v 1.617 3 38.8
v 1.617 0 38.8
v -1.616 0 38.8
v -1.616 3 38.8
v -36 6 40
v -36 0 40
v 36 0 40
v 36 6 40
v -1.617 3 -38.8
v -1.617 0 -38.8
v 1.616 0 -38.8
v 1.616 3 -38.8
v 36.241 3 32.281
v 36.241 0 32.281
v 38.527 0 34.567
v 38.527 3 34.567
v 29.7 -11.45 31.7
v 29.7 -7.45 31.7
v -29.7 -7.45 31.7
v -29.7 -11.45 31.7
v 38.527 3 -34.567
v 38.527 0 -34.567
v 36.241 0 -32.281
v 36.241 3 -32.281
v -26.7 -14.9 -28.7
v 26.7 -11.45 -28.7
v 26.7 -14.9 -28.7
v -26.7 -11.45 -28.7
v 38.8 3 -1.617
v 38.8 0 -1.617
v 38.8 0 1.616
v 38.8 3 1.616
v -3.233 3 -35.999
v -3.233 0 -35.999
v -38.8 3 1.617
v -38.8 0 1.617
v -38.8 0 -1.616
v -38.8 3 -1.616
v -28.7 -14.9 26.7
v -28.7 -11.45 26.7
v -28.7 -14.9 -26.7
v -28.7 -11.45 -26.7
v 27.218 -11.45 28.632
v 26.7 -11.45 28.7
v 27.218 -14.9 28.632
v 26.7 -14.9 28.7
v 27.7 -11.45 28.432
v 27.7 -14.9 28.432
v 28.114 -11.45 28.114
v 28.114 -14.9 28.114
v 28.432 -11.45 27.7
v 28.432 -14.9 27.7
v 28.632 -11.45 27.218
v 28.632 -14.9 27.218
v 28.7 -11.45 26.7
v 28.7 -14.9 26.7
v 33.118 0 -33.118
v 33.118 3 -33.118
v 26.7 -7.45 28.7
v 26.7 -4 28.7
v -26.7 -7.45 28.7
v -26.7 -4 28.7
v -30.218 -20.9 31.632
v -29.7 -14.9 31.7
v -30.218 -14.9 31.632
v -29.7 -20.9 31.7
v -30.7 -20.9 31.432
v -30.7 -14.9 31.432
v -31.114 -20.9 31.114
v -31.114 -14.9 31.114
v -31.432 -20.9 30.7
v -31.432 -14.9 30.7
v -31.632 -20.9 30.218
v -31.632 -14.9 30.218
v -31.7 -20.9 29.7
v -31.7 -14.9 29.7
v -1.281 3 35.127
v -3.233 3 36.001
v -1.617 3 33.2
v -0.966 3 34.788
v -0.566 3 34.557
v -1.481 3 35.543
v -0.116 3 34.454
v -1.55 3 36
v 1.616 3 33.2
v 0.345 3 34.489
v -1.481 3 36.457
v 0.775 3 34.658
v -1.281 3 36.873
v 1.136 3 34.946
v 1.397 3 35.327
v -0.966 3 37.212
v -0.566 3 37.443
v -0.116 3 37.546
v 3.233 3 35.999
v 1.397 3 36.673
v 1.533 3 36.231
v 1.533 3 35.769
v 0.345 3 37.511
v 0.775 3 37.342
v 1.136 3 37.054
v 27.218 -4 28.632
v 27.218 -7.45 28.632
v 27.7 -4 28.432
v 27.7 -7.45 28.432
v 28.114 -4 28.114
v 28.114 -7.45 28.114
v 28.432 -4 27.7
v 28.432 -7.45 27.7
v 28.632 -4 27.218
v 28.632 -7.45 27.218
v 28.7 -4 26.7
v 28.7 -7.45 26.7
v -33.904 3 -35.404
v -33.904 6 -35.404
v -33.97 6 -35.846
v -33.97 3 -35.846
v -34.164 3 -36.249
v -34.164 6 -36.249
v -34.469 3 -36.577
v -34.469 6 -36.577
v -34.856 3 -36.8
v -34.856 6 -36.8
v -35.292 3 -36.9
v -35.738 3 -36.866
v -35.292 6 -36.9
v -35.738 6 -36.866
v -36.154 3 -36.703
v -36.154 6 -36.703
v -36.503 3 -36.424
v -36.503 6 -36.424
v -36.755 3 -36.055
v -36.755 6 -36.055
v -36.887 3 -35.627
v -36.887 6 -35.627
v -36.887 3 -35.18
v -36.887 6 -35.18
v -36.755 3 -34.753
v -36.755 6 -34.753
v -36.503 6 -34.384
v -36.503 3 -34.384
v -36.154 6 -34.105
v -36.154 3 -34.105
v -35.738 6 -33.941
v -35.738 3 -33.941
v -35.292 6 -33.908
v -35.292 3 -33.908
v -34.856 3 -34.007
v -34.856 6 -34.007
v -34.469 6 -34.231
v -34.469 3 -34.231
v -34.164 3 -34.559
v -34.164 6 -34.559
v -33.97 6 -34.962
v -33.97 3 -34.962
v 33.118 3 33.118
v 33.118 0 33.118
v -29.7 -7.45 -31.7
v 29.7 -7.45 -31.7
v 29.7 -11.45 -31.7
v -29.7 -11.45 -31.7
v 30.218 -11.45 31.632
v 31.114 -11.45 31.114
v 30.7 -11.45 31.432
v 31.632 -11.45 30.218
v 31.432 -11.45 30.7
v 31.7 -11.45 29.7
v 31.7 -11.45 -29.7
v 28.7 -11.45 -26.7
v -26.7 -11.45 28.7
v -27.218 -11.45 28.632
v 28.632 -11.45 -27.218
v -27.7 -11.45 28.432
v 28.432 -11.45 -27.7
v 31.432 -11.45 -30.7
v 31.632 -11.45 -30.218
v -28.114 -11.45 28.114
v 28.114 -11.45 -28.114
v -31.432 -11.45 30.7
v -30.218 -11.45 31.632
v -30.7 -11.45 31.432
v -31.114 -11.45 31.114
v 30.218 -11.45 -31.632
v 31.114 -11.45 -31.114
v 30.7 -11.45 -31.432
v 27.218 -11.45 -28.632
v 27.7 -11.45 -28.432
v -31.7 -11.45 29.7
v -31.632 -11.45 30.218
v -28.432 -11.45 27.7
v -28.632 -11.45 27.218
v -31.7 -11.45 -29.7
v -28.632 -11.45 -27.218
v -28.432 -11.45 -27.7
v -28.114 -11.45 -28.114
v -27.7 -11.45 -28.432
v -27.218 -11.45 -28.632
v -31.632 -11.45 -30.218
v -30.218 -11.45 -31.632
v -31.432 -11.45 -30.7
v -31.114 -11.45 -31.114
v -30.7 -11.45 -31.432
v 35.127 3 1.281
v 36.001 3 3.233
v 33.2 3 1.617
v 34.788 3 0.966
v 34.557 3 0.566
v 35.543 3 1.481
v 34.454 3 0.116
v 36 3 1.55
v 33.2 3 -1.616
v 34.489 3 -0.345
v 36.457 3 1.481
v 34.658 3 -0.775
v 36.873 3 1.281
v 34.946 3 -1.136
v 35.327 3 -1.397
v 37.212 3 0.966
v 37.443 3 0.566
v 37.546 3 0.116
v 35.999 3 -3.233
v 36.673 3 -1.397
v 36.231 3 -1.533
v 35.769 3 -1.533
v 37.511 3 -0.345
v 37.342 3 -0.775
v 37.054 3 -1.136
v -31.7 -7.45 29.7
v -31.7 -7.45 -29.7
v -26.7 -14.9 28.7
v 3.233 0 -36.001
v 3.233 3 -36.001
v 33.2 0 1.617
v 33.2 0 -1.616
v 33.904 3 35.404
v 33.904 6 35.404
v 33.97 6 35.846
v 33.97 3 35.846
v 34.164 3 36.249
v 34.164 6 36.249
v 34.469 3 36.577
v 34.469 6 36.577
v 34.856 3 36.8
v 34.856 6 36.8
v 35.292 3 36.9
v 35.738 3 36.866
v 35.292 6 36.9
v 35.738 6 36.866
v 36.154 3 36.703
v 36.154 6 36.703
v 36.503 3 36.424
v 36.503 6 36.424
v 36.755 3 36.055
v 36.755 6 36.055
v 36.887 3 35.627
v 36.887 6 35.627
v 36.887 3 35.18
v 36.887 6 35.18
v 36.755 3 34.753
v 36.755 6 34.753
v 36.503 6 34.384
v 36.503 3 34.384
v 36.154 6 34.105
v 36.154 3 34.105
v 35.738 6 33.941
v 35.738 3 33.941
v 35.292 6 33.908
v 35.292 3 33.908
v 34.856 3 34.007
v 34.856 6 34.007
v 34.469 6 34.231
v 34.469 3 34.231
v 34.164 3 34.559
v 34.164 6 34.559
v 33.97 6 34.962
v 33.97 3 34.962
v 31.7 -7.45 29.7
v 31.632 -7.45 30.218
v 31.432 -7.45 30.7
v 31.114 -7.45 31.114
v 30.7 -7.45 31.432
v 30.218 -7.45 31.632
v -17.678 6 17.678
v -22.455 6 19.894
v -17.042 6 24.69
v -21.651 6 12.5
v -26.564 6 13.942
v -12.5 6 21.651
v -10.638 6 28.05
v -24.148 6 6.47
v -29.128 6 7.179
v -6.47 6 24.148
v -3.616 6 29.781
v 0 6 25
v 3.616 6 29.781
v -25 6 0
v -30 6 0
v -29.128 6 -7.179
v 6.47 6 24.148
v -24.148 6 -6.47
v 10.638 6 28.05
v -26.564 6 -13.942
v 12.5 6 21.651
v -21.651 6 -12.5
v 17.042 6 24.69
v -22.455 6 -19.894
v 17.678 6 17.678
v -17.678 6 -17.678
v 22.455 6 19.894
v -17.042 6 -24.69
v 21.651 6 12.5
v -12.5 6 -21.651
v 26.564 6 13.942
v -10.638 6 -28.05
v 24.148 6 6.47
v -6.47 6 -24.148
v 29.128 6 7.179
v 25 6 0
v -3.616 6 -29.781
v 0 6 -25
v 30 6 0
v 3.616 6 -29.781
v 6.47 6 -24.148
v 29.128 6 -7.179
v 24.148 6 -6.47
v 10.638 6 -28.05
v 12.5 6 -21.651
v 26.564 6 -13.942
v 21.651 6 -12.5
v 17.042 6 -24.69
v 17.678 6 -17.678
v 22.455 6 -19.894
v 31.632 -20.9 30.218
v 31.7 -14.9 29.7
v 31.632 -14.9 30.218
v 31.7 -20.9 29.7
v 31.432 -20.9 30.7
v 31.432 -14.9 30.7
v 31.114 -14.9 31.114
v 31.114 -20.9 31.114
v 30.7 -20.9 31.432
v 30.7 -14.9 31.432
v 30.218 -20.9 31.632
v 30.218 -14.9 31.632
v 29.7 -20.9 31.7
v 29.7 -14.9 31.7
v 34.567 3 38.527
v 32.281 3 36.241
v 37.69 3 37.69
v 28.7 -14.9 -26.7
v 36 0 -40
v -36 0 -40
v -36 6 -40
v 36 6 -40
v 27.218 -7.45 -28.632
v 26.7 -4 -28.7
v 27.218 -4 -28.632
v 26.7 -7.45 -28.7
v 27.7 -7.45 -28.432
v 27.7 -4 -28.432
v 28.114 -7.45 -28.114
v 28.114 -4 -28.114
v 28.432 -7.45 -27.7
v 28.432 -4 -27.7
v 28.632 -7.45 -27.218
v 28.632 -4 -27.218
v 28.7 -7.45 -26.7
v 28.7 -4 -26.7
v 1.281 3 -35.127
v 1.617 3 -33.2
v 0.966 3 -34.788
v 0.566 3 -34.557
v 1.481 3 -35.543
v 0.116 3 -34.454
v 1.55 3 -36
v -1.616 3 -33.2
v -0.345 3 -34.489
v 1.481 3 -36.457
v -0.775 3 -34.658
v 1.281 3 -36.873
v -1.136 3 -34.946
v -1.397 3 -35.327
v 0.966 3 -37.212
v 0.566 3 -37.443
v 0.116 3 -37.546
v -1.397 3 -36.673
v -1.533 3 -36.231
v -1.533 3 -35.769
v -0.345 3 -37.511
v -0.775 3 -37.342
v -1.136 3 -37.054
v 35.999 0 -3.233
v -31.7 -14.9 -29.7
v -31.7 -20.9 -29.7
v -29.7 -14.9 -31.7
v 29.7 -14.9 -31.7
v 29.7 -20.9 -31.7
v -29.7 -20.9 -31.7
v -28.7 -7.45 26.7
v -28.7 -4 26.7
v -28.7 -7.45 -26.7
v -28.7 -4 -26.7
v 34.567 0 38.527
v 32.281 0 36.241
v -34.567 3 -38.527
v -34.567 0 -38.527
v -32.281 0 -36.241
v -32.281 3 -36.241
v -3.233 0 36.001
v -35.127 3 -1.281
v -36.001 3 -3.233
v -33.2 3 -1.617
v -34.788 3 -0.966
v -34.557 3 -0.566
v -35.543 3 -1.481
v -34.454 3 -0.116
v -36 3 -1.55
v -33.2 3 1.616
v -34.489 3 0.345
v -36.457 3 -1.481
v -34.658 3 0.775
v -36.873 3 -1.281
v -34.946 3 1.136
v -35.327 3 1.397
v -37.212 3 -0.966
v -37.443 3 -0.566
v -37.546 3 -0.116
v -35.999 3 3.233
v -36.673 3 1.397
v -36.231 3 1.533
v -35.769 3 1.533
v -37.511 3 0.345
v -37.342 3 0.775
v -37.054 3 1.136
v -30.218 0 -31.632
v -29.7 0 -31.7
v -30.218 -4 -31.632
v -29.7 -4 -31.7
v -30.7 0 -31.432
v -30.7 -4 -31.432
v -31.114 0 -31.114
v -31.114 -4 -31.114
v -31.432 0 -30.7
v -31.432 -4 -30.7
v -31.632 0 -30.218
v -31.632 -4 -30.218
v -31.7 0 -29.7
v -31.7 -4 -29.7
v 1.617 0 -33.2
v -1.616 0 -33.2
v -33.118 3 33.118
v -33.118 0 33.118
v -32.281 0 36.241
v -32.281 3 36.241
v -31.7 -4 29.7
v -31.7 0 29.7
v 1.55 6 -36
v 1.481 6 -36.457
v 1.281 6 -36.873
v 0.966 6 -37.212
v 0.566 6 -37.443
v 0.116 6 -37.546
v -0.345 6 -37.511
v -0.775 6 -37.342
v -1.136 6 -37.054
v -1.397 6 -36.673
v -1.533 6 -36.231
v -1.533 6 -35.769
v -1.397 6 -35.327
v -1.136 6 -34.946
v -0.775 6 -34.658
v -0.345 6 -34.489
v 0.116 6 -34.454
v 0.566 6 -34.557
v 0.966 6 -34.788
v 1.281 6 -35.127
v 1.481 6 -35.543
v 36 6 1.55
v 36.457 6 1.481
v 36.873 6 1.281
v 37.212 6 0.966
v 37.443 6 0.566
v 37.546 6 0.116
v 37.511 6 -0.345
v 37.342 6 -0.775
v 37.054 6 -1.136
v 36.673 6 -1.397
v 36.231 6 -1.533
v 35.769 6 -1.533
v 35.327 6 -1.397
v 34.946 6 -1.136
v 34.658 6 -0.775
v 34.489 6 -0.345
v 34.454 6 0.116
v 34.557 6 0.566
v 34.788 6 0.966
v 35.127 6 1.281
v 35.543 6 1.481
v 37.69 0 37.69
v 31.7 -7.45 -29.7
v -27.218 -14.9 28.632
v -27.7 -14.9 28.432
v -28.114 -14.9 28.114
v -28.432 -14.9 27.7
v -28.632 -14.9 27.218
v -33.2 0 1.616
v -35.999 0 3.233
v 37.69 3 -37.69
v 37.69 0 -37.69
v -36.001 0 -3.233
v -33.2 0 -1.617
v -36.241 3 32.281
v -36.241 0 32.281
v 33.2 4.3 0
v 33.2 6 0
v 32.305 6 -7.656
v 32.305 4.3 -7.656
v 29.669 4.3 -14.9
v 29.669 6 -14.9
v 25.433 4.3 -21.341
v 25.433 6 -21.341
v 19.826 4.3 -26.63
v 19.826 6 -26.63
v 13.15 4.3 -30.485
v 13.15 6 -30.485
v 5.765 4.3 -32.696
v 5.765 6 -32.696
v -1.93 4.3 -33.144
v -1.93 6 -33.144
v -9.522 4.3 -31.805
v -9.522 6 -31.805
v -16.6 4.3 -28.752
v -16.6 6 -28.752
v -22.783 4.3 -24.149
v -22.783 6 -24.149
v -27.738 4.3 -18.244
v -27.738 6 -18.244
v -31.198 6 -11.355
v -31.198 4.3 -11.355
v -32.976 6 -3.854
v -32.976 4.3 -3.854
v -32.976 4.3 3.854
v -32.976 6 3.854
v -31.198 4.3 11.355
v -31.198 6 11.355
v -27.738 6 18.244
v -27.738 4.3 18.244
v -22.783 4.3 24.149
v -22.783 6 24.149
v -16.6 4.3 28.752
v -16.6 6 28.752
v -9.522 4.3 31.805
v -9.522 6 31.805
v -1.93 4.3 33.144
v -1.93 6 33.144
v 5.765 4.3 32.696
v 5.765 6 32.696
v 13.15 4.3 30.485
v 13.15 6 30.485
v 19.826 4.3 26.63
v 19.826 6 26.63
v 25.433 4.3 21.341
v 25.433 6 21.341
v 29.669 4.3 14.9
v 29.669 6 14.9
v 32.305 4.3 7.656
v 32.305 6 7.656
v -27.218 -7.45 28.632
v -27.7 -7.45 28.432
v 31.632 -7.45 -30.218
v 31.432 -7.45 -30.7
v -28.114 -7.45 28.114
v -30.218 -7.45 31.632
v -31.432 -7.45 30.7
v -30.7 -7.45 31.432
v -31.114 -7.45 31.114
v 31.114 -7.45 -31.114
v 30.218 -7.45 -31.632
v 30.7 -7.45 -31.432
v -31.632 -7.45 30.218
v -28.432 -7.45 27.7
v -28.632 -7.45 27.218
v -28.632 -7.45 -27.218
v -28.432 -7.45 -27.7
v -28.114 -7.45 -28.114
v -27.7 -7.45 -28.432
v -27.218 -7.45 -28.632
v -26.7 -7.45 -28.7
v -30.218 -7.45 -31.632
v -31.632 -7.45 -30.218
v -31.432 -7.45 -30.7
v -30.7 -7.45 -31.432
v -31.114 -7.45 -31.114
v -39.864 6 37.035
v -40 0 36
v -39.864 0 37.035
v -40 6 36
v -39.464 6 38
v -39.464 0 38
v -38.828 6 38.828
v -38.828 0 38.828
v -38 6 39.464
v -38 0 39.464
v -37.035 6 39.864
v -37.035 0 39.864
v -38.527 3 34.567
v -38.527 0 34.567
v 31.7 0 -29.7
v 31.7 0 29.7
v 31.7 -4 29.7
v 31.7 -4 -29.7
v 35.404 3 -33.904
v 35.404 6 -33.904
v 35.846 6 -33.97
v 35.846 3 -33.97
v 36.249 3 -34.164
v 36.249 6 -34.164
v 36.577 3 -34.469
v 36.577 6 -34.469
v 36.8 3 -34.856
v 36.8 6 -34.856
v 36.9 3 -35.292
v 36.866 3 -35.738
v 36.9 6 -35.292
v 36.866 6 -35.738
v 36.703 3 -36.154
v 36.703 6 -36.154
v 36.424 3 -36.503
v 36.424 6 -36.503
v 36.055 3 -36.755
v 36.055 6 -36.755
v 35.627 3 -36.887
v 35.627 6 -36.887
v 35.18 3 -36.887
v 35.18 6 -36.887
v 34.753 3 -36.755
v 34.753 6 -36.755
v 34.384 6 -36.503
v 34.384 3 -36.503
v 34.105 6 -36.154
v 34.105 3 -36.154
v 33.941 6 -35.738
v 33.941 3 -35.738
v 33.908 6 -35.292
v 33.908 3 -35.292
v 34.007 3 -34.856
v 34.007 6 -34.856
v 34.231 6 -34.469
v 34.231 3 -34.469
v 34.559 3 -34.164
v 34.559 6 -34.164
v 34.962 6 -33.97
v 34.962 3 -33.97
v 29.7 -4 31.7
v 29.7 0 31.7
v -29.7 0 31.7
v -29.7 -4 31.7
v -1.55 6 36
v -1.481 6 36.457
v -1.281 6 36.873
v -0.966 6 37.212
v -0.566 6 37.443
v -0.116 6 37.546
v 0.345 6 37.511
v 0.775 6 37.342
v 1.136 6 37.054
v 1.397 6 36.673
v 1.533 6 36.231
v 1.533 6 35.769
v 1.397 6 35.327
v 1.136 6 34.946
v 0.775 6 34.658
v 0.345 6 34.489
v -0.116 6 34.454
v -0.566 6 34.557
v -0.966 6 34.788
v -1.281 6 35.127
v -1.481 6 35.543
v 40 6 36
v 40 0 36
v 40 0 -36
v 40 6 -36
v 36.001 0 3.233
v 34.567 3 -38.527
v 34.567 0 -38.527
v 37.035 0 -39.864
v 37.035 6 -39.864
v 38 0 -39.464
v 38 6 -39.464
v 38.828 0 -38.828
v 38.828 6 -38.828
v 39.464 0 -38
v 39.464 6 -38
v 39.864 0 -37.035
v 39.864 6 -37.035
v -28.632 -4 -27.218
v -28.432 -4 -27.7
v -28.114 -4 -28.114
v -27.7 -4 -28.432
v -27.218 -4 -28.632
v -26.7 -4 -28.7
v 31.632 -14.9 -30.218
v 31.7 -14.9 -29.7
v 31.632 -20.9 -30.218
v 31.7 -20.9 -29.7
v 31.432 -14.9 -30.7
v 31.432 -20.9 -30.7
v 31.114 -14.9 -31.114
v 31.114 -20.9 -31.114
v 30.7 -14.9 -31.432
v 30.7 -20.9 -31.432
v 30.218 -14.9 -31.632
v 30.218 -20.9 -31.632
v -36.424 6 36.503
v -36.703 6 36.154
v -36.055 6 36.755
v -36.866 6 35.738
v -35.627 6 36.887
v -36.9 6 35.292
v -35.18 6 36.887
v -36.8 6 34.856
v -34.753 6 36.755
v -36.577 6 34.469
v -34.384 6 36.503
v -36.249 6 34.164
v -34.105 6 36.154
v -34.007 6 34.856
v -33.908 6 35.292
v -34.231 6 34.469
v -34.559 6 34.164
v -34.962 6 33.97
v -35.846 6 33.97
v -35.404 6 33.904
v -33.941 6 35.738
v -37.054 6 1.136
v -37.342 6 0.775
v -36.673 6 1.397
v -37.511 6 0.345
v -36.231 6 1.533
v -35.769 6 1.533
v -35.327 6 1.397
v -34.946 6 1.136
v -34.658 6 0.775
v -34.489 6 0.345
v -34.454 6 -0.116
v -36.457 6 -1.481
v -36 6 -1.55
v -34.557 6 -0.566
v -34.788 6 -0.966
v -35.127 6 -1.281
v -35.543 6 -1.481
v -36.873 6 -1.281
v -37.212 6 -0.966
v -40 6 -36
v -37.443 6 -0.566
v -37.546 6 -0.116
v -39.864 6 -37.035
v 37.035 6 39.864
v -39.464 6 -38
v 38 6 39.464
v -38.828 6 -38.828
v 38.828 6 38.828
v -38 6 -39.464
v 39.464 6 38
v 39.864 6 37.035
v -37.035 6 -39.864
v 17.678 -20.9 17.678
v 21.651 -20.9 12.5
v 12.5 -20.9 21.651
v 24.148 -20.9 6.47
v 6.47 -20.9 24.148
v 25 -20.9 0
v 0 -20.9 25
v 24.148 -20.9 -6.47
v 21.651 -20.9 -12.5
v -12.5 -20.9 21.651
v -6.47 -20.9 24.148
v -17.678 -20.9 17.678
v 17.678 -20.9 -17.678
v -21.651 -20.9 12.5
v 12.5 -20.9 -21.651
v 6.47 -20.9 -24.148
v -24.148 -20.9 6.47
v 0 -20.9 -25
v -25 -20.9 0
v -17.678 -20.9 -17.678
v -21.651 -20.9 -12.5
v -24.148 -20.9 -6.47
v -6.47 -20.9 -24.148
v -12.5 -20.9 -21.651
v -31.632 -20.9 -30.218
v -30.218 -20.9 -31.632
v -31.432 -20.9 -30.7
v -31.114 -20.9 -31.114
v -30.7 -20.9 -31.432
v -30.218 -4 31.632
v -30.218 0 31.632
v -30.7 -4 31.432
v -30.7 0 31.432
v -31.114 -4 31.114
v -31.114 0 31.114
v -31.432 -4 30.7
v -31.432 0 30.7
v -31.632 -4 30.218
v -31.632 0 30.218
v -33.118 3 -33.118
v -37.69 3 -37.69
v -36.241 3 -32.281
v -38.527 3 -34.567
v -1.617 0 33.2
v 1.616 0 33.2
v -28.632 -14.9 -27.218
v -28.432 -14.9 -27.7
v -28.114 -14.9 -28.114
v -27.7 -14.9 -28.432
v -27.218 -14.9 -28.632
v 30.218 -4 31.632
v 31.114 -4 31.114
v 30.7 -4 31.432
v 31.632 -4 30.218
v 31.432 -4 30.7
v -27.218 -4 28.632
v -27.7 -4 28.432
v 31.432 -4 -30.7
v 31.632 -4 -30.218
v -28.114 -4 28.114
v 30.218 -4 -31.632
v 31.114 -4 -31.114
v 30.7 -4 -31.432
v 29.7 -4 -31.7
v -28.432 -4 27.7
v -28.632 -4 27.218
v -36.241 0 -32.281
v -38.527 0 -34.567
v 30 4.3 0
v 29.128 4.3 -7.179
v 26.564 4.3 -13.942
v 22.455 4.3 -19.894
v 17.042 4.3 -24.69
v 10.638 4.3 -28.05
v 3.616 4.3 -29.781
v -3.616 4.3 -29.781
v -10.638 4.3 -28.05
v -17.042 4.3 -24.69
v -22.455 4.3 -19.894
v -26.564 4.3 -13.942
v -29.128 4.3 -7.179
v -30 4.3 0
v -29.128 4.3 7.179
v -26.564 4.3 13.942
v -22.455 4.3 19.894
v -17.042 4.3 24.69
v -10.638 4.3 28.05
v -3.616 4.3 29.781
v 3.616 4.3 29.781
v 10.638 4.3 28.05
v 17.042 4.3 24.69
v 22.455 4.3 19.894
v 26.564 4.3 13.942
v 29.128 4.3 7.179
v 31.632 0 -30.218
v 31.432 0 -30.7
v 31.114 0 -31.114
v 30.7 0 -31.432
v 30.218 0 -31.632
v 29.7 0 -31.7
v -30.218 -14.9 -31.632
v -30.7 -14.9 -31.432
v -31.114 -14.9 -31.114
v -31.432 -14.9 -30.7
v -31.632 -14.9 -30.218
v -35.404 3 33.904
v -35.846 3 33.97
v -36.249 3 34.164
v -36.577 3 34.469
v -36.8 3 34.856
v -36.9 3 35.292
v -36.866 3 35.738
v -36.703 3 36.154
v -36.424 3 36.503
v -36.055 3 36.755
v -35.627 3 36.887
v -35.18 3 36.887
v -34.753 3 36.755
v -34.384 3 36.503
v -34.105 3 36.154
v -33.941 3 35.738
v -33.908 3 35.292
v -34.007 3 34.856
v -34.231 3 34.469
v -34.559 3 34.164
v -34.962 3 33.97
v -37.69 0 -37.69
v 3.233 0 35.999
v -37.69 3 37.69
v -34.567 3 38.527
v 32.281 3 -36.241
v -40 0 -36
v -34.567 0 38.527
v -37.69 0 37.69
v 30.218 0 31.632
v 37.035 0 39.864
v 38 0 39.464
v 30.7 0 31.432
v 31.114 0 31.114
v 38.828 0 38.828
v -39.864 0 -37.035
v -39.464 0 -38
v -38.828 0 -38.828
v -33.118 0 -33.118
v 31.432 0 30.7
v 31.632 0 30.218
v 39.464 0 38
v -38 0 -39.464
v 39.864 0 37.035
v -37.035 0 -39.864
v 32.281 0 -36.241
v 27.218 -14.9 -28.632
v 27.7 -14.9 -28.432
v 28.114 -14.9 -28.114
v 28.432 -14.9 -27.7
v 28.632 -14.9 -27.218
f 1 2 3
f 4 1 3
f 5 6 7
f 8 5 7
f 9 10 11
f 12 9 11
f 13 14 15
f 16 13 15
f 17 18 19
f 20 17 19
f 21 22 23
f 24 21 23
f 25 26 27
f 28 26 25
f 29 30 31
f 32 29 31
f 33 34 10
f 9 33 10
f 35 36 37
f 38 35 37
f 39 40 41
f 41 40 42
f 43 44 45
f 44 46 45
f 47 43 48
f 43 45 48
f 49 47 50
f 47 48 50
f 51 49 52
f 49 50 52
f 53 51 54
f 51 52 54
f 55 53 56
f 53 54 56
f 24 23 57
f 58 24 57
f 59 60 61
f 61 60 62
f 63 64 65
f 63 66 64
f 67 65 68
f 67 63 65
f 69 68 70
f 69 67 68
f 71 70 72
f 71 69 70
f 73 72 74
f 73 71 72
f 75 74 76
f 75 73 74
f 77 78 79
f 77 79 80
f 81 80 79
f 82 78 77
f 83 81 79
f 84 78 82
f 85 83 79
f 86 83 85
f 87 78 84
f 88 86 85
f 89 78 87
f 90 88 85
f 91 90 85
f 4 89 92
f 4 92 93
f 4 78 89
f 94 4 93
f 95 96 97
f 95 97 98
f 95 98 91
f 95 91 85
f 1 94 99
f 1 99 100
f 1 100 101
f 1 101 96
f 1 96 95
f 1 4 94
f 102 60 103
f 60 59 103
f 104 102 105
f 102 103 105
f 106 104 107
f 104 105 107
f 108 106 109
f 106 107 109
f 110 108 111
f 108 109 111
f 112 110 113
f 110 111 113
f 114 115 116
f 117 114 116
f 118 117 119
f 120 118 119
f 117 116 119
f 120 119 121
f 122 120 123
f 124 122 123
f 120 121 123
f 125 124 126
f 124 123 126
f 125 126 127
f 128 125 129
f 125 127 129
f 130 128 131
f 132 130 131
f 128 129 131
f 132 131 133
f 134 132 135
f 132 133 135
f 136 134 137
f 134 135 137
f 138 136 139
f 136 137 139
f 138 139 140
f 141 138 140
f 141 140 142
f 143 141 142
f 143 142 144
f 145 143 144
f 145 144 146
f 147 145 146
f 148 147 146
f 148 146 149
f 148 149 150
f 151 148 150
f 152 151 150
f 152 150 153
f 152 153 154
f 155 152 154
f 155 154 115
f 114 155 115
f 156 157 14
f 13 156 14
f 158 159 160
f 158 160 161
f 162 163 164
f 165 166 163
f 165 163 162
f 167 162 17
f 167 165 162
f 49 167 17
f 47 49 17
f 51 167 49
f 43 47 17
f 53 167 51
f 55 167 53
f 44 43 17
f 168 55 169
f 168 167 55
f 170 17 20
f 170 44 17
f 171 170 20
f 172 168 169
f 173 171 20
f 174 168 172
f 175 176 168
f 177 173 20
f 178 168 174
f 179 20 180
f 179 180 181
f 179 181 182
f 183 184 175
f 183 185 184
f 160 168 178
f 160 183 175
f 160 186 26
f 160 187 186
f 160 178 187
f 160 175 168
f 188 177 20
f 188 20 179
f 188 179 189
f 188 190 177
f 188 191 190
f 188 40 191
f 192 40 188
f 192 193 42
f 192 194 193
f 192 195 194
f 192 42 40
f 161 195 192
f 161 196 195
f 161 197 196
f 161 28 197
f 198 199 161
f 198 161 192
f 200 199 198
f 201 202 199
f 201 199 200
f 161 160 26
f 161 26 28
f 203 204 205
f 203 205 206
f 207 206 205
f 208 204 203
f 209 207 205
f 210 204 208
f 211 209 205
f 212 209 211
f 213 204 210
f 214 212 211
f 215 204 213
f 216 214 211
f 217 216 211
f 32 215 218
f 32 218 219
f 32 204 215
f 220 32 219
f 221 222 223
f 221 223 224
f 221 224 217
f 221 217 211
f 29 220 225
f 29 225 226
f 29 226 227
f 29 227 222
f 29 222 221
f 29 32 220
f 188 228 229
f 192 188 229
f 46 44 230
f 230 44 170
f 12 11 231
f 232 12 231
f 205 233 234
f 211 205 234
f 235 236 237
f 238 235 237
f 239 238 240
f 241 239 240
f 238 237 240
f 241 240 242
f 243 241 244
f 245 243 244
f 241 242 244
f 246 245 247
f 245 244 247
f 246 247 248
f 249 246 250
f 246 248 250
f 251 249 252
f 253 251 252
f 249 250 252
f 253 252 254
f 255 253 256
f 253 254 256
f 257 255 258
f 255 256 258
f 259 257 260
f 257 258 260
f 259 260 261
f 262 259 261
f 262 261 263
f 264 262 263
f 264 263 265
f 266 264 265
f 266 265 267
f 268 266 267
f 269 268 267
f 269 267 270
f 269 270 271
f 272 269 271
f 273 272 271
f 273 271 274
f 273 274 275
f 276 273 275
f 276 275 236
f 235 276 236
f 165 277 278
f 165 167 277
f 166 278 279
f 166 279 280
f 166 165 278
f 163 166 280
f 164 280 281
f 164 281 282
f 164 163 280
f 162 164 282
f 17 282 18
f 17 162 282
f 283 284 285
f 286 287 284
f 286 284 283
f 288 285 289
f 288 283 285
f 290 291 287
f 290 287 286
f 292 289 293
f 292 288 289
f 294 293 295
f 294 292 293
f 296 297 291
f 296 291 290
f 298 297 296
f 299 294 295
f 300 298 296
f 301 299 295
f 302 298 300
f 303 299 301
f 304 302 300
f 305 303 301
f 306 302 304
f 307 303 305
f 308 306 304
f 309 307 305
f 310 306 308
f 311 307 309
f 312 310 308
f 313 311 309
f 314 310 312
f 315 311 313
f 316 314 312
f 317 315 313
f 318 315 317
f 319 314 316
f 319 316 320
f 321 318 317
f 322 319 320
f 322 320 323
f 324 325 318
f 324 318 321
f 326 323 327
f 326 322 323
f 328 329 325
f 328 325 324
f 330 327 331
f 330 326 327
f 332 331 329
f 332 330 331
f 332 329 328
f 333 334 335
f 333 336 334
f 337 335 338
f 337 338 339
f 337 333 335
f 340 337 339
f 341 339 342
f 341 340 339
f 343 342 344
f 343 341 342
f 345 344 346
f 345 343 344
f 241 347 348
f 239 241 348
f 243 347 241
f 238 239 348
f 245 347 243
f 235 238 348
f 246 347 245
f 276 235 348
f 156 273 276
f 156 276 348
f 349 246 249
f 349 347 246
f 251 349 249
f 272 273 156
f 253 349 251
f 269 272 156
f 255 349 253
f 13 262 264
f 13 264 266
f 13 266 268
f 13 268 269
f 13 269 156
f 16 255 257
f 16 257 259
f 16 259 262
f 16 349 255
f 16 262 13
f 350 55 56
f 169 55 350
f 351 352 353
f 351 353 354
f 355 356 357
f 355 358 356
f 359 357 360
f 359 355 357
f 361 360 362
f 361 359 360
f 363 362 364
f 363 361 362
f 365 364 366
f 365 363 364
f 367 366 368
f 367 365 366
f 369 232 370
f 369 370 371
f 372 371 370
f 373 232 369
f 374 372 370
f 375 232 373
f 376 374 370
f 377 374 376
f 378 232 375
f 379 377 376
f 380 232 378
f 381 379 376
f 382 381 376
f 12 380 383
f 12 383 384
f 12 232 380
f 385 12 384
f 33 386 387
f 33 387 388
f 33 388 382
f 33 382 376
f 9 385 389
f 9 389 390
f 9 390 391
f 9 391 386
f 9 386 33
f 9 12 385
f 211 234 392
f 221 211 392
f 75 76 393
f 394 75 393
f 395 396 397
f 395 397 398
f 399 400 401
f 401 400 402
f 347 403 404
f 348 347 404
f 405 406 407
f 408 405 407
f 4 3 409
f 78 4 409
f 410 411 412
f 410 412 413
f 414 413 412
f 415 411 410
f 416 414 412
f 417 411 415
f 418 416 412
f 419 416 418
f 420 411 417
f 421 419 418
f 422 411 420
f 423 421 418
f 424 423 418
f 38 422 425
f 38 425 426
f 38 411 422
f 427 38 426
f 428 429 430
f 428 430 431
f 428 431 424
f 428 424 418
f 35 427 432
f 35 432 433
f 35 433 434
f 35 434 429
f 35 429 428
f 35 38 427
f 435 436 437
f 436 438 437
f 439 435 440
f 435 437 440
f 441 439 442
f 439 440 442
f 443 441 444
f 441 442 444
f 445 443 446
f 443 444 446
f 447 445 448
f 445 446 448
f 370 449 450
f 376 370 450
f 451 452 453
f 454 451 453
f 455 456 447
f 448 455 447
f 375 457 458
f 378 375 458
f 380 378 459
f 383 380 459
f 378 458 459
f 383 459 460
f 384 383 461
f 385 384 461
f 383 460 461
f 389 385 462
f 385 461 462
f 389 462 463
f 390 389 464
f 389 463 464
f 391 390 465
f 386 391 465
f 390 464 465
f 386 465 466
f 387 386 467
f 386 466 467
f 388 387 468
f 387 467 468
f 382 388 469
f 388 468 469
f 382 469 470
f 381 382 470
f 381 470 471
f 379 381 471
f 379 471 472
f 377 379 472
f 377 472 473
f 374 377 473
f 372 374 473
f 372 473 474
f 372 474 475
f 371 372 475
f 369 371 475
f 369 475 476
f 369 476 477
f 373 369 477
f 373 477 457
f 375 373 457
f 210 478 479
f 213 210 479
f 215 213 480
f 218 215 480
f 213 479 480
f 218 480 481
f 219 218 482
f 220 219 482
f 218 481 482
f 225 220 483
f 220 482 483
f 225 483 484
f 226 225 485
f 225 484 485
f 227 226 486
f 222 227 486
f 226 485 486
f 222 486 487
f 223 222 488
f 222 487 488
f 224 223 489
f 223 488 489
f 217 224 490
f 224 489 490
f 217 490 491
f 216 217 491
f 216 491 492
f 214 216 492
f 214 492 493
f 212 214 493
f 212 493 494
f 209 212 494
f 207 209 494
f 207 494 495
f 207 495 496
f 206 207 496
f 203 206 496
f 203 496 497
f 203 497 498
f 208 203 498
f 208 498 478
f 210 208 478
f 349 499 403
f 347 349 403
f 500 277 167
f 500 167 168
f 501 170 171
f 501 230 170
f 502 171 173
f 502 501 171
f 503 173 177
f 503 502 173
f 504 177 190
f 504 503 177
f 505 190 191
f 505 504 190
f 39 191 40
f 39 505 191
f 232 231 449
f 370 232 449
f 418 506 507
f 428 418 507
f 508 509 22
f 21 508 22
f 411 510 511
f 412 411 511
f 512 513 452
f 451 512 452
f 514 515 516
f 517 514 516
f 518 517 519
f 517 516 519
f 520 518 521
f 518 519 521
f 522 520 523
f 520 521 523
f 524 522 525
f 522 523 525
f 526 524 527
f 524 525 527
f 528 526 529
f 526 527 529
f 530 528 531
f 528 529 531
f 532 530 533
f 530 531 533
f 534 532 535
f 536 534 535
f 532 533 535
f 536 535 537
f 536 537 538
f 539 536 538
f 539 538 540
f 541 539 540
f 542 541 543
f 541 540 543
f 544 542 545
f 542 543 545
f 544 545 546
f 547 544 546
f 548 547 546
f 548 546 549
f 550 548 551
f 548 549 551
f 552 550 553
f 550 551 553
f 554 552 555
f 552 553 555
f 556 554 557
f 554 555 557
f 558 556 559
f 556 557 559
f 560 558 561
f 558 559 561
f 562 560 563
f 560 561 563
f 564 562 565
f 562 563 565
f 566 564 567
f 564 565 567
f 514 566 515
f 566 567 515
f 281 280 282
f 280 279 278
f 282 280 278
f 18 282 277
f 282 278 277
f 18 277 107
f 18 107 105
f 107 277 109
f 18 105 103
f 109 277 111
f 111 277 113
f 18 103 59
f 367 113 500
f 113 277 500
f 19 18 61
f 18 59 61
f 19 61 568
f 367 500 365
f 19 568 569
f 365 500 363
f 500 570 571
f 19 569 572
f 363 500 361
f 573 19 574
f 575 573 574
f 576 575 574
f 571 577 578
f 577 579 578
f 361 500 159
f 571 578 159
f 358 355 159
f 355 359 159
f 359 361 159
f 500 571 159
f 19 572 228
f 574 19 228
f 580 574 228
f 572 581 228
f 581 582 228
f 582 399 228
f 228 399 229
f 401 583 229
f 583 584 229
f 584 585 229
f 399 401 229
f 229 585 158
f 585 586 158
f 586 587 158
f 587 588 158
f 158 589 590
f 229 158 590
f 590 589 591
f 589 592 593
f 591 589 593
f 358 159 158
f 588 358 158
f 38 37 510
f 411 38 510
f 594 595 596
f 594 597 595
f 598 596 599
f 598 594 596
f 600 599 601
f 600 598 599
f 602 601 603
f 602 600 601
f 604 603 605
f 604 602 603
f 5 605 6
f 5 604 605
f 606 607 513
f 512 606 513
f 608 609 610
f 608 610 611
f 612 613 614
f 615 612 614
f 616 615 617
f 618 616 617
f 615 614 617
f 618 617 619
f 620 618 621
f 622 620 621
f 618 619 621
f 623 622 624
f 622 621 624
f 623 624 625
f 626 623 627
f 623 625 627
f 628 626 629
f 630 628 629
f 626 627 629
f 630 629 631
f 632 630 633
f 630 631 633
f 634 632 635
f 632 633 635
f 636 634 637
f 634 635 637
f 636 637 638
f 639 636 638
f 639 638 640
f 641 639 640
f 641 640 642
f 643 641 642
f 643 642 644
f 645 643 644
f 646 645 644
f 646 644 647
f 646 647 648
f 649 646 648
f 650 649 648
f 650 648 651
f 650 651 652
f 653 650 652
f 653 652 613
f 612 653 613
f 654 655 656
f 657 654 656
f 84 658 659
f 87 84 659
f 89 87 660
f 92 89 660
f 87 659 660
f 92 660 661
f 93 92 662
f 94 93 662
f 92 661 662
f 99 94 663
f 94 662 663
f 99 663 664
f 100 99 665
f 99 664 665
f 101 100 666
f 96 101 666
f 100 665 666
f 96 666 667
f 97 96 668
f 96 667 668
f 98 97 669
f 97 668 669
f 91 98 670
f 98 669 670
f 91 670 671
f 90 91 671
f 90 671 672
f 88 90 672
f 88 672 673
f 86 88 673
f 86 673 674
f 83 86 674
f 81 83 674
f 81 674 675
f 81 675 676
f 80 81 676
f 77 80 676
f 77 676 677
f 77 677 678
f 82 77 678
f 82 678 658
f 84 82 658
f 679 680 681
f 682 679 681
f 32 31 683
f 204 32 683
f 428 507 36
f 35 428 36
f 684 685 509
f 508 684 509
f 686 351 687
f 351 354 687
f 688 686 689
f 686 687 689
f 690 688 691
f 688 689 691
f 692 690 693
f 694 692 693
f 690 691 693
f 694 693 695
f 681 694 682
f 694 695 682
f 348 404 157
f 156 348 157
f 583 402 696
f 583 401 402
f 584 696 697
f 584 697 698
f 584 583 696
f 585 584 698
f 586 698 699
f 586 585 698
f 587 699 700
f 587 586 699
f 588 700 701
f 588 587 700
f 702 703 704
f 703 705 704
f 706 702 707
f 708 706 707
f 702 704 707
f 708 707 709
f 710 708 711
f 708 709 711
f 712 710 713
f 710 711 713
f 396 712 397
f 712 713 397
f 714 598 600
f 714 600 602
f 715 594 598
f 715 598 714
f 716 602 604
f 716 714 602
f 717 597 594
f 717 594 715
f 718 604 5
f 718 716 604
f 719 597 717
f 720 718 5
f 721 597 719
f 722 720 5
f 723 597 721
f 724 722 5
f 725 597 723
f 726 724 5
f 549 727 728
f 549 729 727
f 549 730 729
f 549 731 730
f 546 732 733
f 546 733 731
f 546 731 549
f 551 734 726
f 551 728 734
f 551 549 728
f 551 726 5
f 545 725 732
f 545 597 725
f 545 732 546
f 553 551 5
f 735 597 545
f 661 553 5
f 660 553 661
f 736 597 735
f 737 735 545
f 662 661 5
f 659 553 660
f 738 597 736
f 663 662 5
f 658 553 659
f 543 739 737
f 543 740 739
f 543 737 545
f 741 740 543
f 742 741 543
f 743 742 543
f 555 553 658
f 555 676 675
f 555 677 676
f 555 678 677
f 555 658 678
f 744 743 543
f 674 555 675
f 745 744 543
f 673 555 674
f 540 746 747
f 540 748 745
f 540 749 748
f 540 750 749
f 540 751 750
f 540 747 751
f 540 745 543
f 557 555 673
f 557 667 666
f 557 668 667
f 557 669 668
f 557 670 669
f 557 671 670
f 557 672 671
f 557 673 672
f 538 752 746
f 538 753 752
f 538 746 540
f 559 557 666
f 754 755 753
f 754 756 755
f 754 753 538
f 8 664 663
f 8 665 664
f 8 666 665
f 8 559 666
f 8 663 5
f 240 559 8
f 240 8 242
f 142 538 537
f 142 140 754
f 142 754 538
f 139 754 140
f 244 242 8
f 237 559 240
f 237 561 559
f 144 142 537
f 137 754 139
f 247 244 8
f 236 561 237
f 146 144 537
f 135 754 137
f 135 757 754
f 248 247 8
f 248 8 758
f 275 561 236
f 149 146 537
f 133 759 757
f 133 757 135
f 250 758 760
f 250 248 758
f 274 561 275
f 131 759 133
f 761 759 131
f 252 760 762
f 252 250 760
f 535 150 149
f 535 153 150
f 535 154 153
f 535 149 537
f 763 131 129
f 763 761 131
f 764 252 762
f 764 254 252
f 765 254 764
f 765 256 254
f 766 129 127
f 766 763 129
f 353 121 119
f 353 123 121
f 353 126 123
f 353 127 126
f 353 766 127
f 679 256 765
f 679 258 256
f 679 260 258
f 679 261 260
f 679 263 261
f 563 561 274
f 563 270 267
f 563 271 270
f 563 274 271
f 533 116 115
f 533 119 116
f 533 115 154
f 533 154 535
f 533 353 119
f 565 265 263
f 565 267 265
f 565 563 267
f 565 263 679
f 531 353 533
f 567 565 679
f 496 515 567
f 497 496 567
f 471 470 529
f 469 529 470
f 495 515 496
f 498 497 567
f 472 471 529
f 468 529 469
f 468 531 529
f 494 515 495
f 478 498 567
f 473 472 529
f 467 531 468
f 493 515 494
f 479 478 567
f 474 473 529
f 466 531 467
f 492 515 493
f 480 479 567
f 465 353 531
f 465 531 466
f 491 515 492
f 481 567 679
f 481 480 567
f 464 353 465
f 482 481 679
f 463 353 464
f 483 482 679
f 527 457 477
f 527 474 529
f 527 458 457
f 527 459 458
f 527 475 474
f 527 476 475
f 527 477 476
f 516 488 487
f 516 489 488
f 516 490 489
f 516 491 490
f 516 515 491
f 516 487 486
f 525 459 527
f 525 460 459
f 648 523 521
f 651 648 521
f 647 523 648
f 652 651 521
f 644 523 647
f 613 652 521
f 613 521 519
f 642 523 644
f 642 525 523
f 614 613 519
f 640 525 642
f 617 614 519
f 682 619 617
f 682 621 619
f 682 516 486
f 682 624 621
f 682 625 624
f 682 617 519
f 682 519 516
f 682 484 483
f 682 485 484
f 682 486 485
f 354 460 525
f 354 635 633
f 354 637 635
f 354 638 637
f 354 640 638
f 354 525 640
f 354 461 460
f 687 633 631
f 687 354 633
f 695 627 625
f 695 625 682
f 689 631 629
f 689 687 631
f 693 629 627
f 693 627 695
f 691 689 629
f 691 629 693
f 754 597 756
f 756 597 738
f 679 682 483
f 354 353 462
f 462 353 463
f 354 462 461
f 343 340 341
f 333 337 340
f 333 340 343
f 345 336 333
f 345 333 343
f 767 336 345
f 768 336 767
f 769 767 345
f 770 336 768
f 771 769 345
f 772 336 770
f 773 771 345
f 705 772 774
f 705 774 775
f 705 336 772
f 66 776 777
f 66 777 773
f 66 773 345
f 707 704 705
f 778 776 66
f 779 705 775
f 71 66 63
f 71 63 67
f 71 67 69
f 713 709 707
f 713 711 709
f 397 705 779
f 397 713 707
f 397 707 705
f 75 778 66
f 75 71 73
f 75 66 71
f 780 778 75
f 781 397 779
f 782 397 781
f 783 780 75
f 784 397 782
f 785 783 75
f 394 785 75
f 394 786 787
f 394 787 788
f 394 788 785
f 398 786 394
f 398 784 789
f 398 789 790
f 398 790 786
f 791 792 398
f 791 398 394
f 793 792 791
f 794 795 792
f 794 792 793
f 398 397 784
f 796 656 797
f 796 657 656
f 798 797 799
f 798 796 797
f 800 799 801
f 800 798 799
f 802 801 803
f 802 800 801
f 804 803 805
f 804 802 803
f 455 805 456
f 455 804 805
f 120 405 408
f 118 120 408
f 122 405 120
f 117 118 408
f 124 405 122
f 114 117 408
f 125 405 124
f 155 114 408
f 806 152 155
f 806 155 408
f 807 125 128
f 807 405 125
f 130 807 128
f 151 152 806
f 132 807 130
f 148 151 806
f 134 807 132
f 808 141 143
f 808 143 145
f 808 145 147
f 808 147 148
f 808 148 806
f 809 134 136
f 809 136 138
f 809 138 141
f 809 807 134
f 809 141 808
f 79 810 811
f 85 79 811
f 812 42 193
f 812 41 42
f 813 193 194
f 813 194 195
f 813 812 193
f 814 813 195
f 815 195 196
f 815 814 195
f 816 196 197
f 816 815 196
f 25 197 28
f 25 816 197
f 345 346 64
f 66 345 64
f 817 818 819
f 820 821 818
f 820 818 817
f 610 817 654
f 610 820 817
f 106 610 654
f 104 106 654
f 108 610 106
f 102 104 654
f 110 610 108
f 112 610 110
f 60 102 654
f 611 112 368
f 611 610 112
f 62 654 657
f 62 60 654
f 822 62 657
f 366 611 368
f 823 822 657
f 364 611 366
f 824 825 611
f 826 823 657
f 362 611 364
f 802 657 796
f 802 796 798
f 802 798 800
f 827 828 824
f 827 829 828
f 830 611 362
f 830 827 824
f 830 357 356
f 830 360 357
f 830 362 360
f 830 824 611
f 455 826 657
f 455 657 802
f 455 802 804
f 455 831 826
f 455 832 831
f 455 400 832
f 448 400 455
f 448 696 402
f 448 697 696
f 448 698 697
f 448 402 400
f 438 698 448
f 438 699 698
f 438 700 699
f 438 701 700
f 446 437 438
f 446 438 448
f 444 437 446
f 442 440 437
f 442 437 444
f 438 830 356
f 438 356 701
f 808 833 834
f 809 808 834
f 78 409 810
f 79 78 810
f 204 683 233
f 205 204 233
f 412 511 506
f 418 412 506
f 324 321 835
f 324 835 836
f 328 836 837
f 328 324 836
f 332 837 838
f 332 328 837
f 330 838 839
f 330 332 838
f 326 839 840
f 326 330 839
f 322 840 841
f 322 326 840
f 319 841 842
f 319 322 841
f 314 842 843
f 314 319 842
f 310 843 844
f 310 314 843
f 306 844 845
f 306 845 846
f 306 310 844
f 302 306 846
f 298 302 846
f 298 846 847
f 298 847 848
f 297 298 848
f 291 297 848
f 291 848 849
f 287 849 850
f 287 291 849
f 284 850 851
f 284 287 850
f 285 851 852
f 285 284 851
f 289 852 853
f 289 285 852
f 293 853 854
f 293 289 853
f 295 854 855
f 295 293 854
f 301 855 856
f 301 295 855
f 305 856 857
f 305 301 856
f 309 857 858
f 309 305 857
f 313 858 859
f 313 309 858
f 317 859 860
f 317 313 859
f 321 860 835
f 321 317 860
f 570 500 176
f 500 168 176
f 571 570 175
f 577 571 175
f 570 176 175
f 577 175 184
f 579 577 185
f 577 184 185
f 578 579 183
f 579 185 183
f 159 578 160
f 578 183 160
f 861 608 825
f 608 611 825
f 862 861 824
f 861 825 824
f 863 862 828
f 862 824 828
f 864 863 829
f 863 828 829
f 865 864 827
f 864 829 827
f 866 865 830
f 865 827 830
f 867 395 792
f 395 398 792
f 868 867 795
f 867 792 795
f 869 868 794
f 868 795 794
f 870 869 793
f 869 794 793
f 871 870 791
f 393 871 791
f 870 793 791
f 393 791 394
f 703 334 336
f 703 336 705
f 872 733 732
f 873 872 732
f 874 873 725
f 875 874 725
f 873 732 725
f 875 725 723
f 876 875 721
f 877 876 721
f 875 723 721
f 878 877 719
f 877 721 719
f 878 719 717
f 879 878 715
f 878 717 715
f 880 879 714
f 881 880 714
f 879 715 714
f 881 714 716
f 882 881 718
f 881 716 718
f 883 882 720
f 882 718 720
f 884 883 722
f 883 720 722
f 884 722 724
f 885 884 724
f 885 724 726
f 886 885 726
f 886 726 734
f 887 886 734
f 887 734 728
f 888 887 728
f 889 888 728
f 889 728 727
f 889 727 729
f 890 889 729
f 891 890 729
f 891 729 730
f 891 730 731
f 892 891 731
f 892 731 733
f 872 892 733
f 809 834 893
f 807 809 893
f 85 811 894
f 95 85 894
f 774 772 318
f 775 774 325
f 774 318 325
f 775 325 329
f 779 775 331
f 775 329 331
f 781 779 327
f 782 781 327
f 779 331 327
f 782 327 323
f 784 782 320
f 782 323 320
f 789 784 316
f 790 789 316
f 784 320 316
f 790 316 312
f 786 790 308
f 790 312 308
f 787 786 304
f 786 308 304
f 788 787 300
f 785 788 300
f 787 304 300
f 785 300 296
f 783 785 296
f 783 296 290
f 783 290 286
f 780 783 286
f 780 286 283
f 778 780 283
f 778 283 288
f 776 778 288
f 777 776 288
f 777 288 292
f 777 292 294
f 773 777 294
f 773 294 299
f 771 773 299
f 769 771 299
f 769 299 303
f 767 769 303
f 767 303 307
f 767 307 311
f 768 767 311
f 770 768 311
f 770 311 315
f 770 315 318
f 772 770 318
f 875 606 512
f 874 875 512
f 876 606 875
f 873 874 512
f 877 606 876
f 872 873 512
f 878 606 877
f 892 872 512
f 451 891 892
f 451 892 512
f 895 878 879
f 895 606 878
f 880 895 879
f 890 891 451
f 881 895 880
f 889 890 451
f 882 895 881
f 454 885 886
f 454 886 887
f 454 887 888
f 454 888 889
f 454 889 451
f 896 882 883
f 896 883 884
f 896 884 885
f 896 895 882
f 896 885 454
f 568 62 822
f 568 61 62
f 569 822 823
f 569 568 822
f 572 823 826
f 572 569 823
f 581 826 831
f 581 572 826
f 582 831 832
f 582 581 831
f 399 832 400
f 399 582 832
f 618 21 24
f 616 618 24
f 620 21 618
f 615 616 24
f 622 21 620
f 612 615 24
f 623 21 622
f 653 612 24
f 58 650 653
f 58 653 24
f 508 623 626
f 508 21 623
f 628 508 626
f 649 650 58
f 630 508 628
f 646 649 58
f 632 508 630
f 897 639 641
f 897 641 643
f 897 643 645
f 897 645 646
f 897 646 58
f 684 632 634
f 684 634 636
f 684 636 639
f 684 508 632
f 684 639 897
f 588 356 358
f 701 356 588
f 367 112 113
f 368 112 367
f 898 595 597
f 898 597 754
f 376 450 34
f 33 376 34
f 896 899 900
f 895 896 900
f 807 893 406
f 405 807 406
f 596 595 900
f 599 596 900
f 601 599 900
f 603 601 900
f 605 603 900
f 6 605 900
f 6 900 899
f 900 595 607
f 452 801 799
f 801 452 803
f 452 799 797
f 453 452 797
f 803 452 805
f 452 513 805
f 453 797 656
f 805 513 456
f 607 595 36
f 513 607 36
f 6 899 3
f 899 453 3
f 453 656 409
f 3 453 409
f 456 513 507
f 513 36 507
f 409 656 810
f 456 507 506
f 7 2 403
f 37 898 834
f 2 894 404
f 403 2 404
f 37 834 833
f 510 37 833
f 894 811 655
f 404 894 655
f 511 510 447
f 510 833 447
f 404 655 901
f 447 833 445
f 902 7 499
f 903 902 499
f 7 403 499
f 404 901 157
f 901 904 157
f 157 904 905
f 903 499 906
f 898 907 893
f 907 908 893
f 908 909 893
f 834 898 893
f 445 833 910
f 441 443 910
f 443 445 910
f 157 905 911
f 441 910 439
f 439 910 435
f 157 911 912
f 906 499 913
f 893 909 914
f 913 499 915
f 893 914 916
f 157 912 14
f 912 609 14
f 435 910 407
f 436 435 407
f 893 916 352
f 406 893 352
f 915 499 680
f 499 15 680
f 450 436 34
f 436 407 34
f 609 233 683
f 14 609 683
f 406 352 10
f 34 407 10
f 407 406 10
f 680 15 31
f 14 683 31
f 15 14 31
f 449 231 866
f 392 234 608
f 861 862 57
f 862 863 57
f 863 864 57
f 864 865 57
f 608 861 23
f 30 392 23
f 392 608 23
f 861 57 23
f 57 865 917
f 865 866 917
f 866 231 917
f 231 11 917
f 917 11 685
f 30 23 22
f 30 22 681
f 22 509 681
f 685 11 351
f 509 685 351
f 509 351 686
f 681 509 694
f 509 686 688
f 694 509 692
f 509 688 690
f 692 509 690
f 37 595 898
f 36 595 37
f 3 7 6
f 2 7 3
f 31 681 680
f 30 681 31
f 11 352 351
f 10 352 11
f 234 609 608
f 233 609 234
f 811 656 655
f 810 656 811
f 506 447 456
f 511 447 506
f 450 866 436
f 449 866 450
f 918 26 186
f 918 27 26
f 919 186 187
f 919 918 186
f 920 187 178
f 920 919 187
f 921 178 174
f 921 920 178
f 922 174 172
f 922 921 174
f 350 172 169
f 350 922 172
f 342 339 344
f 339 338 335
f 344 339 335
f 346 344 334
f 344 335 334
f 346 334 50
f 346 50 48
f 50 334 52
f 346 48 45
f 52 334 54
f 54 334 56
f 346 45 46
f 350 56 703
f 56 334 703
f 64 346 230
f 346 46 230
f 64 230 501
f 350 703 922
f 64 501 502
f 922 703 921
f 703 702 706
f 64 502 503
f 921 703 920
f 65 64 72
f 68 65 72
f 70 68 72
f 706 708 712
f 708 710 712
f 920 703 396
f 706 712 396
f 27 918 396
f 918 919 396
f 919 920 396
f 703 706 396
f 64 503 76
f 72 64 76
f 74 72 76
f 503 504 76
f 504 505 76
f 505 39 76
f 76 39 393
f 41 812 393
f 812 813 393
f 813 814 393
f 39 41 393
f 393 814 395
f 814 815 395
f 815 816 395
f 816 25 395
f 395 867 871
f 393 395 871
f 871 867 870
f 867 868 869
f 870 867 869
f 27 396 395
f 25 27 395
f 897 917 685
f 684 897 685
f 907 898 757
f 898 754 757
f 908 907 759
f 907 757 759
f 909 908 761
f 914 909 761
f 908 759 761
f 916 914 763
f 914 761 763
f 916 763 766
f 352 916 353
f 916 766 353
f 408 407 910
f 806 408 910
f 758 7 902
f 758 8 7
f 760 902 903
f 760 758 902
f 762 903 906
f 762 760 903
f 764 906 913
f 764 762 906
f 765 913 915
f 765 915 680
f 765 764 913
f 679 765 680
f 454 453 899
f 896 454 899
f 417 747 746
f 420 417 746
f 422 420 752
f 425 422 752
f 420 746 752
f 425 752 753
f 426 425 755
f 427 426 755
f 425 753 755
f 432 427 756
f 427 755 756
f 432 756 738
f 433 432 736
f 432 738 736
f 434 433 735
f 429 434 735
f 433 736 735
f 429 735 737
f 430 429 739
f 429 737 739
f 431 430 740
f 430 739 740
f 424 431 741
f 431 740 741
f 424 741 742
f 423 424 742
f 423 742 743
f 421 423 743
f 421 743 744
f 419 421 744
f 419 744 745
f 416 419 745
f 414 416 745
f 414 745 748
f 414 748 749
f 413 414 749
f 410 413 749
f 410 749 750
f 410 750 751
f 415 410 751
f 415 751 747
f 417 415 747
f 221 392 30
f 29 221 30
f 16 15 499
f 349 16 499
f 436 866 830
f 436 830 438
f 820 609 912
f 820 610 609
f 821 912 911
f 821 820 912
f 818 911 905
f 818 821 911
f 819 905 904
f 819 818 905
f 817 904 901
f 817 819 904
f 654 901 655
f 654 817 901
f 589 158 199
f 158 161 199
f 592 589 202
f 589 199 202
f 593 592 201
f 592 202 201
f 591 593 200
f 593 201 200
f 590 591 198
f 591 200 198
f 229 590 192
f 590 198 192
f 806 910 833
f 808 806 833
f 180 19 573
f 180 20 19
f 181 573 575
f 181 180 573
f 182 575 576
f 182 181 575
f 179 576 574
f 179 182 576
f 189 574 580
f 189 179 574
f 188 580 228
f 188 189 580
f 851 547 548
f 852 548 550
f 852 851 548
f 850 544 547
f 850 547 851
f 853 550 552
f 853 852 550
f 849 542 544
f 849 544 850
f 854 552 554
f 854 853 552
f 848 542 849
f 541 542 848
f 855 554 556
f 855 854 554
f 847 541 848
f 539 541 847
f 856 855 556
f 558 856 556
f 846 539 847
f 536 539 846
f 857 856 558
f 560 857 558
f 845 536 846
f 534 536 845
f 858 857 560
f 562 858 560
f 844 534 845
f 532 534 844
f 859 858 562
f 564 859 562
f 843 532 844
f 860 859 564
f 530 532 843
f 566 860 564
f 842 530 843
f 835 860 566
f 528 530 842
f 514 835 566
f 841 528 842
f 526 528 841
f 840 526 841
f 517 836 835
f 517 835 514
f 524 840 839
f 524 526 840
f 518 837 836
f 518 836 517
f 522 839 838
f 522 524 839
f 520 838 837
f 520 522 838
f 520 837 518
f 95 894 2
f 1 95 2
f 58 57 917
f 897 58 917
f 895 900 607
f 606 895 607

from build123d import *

# Parameters (mm, degrees)
SKETCH_3_W               = 80
SKETCH_3_H               = 80
EXTRUDE_1_DEPTH          = 6
SKETCH_4_W               = 63.4
SKETCH_4_H               = 63.4
EXTRUDE_2_DEPTH          = 4
SKETCH_5_W               = 57.4
SKETCH_5_H               = 57.4
EXTRUDE_3_DEPTH          = 3.45
SKETCH_6_W               = 63.4
SKETCH_6_H               = 63.4
EXTRUDE_4_DEPTH          = 4
SKETCH_7_W               = 57.4
SKETCH_7_H               = 57.4
EXTRUDE_5_DEPTH          = 3.45
SKETCH_8_W               = 63.4
SKETCH_8_H               = 63.4
EXTRUDE_6_DEPTH          = 6
SKETCH_11_R              = 25
CUT_EXTRUDE_3_DEPTH      = 1
CUT_EXTRUDE_3_DEPTH_BACK = 27.9
SKETCH_12_R              = 33.2
SKETCH_12_R_2            = 30
CUT_EXTRUDE_4_DEPTH      = 1.7
SKETCH_13_R              = 1.55
CUT_EXTRUDE_5_DEPTH      = 6
PATTERN_CIRCULAR_1_COUNT = 4
SKETCH_14_R              = 1.5
CUT_EXTRUDE_6_DEPTH      = 6
PATTERN_CIRCULAR_2_COUNT = 4
CUT_EXTRUDE_7_DEPTH      = 3
PATTERN_CIRCULAR_3_COUNT = 4
FILLET_1_R               = 2
FILLET_2_R               = 4


with BuildPart() as part:
    # 草图3 → 凸台-拉伸1 (new body)
    with BuildSketch(Plane(origin=(0, 0, 0), x_dir=(1, 0, 0), z_dir=(0, 1, 0))):
        Rectangle(SKETCH_3_W, SKETCH_3_H)
    extrude(amount=EXTRUDE_1_DEPTH)

    # 草图4 → 凸台-拉伸2 (add)
    with BuildSketch(Plane(origin=(0, 0, 0), x_dir=(-1, 0, 0), z_dir=(0, -1, 0))):
        Rectangle(SKETCH_4_W, SKETCH_4_H)
    extrude(amount=EXTRUDE_2_DEPTH)

    # 草图5 → 凸台-拉伸3 (add)
    with BuildSketch(Plane(origin=(0, -4, 0), x_dir=(-1, 0, 0), z_dir=(0, -1, 0))):
        Rectangle(SKETCH_5_W, SKETCH_5_H)
    extrude(amount=EXTRUDE_3_DEPTH)

    # 草图6 → 凸台-拉伸4 (add)
    with BuildSketch(Plane(origin=(0, -7.45, 0), x_dir=(-1, 0, 0), z_dir=(0, -1, 0))):
        Rectangle(SKETCH_6_W, SKETCH_6_H)
    extrude(amount=EXTRUDE_4_DEPTH)

    # 草图7 → 凸台-拉伸5 (add)
    with BuildSketch(Plane(origin=(0, -11.45, 0), x_dir=(-1, 0, 0), z_dir=(0, -1, 0))):
        Rectangle(SKETCH_7_W, SKETCH_7_H)
    extrude(amount=EXTRUDE_5_DEPTH)

    # 草图8 → 凸台-拉伸6 (add)
    with BuildSketch(Plane(origin=(0, -14.9, 0), x_dir=(-1, 0, 0), z_dir=(0, -1, 0))):
        Rectangle(SKETCH_8_W, SKETCH_8_H)
    extrude(amount=EXTRUDE_6_DEPTH)

    # 草图11 → 切除-拉伸3 (cut, two sides)
    with BuildSketch(Plane(origin=(0, 6, 0), x_dir=(1, 0, 0), z_dir=(0, 1, 0))) as cut_extrude_3_sk:
        Circle(SKETCH_11_R)
    extrude(amount=CUT_EXTRUDE_3_DEPTH, mode=Mode.SUBTRACT)
    extrude(cut_extrude_3_sk.sketch, amount=-CUT_EXTRUDE_3_DEPTH_BACK, mode=Mode.SUBTRACT)

    # 草图12 → 切除-拉伸4 (cut)
    with BuildSketch(Plane(origin=(0, 6, 0), x_dir=(1, 0, 0), z_dir=(0, 1, 0))):
        Circle(SKETCH_12_R)
        Circle(SKETCH_12_R_2, mode=Mode.SUBTRACT)
    extrude(amount=-CUT_EXTRUDE_4_DEPTH, mode=Mode.SUBTRACT)

    # 草图13 → 切除-拉伸5 (cut)
    with BuildSketch(Plane(origin=(0, 6, 0), x_dir=(1, 0, 0), z_dir=(0, 1, 0))):
        with Locations((0, 36)):
            Circle(SKETCH_13_R)
    cut_extrude_5 = extrude(amount=-CUT_EXTRUDE_5_DEPTH, mode=Mode.SUBTRACT)

    # 阵列(圆周)1: 切除-拉伸5 ×4 about axis
    pattern_circular_1_axis = Axis((0, 0, 0), (0, 1, 0))
    for i in range(1, PATTERN_CIRCULAR_1_COUNT):
        add(cut_extrude_5.rotate(pattern_circular_1_axis, i * 360 / PATTERN_CIRCULAR_1_COUNT), mode=Mode.SUBTRACT)

    # 草图14 → 切除-拉伸6 (cut)
    with BuildSketch(Plane(origin=(0, 6, 0), x_dir=(1, 0, 0), z_dir=(0, 1, 0))):
        with Locations((-35.403805922, 35.403805922)):
            Circle(SKETCH_14_R)
    cut_extrude_6 = extrude(amount=-CUT_EXTRUDE_6_DEPTH, mode=Mode.SUBTRACT)

    # 阵列(圆周)2: 切除-拉伸6 ×4 about axis
    pattern_circular_2_axis = Axis((0, 0, 0), (0, 1, 0))
    for i in range(1, PATTERN_CIRCULAR_2_COUNT):
        add(cut_extrude_6.rotate(pattern_circular_2_axis, i * 360 / PATTERN_CIRCULAR_2_COUNT), mode=Mode.SUBTRACT)

    # 草图15 → 切除-拉伸7 (cut)
    with BuildSketch(Plane(origin=(0, 0, 0), x_dir=(-1, 0, 0), z_dir=(0, -1, 0))):
        Polygon((1.615900042, 33.199607101), (3.233161412, 35.999214037), (1.61726137, 38.799606936), (-1.615900042, 38.800392899), (-3.233161412, 36.000785963), (-1.61726137, 33.200393064), align=None)
        Polygon((-37.689996349, 37.689996349), (-38.526800123, 34.567002148), (-36.240609696, 32.280811722), (-33.117615496, 33.117615496), (-32.280811722, 36.240609696), (-34.567002148, 38.526800123), align=None)
    cut_extrude_7 = extrude(amount=-CUT_EXTRUDE_7_DEPTH, mode=Mode.SUBTRACT)

    # 阵列(圆周)3: 切除-拉伸7 ×4 about axis
    pattern_circular_3_axis = Axis((0, 0, 0), (0, 1, 0))
    for i in range(1, PATTERN_CIRCULAR_3_COUNT):
        add(cut_extrude_7.rotate(pattern_circular_3_axis, i * 360 / PATTERN_CIRCULAR_3_COUNT), mode=Mode.SUBTRACT)

    # 圆角1
    fillet_1_edges = [part.edges().sort_by_distance(p)[0] for p in [
        (-31.7, -2, 31.7),
        (-31.7, -2, -31.7),
        (31.7, -2, -31.7),
        (31.7, -2, 31.7),
        (-28.7, -5.725, 28.7),
        (-28.7, -5.725, -28.7),
        (28.7, -5.725, -28.7),
        (28.7, -5.725, 28.7),
        (-31.7, -9.45, 31.7),
        (-31.7, -9.45, -31.7),
        (31.7, -9.45, -31.7),
        (31.7, -9.45, 31.7),
        (-28.7, -13.175, 28.7),
        (-28.7, -13.175, -28.7),
        (28.7, -13.175, -28.7),
        (28.7, -13.175, 28.7),
        (-31.7, -17.9, 31.7),
        (-31.7, -17.9, -31.7),
        (31.7, -17.9, -31.7),
        (31.7, -17.9, 31.7),
    ]]
    fillet(fillet_1_edges, radius=FILLET_1_R)

    # 圆角2
    fillet_2_edges = [part.edges().sort_by_distance(p)[0] for p in [
        (40, 3, 40),
        (-40, 3, 40),
        (-40, 3, -40),
        (40, 3, -40),
    ]]
    fillet(fillet_2_edges, radius=FILLET_2_R)


solid = part.part
